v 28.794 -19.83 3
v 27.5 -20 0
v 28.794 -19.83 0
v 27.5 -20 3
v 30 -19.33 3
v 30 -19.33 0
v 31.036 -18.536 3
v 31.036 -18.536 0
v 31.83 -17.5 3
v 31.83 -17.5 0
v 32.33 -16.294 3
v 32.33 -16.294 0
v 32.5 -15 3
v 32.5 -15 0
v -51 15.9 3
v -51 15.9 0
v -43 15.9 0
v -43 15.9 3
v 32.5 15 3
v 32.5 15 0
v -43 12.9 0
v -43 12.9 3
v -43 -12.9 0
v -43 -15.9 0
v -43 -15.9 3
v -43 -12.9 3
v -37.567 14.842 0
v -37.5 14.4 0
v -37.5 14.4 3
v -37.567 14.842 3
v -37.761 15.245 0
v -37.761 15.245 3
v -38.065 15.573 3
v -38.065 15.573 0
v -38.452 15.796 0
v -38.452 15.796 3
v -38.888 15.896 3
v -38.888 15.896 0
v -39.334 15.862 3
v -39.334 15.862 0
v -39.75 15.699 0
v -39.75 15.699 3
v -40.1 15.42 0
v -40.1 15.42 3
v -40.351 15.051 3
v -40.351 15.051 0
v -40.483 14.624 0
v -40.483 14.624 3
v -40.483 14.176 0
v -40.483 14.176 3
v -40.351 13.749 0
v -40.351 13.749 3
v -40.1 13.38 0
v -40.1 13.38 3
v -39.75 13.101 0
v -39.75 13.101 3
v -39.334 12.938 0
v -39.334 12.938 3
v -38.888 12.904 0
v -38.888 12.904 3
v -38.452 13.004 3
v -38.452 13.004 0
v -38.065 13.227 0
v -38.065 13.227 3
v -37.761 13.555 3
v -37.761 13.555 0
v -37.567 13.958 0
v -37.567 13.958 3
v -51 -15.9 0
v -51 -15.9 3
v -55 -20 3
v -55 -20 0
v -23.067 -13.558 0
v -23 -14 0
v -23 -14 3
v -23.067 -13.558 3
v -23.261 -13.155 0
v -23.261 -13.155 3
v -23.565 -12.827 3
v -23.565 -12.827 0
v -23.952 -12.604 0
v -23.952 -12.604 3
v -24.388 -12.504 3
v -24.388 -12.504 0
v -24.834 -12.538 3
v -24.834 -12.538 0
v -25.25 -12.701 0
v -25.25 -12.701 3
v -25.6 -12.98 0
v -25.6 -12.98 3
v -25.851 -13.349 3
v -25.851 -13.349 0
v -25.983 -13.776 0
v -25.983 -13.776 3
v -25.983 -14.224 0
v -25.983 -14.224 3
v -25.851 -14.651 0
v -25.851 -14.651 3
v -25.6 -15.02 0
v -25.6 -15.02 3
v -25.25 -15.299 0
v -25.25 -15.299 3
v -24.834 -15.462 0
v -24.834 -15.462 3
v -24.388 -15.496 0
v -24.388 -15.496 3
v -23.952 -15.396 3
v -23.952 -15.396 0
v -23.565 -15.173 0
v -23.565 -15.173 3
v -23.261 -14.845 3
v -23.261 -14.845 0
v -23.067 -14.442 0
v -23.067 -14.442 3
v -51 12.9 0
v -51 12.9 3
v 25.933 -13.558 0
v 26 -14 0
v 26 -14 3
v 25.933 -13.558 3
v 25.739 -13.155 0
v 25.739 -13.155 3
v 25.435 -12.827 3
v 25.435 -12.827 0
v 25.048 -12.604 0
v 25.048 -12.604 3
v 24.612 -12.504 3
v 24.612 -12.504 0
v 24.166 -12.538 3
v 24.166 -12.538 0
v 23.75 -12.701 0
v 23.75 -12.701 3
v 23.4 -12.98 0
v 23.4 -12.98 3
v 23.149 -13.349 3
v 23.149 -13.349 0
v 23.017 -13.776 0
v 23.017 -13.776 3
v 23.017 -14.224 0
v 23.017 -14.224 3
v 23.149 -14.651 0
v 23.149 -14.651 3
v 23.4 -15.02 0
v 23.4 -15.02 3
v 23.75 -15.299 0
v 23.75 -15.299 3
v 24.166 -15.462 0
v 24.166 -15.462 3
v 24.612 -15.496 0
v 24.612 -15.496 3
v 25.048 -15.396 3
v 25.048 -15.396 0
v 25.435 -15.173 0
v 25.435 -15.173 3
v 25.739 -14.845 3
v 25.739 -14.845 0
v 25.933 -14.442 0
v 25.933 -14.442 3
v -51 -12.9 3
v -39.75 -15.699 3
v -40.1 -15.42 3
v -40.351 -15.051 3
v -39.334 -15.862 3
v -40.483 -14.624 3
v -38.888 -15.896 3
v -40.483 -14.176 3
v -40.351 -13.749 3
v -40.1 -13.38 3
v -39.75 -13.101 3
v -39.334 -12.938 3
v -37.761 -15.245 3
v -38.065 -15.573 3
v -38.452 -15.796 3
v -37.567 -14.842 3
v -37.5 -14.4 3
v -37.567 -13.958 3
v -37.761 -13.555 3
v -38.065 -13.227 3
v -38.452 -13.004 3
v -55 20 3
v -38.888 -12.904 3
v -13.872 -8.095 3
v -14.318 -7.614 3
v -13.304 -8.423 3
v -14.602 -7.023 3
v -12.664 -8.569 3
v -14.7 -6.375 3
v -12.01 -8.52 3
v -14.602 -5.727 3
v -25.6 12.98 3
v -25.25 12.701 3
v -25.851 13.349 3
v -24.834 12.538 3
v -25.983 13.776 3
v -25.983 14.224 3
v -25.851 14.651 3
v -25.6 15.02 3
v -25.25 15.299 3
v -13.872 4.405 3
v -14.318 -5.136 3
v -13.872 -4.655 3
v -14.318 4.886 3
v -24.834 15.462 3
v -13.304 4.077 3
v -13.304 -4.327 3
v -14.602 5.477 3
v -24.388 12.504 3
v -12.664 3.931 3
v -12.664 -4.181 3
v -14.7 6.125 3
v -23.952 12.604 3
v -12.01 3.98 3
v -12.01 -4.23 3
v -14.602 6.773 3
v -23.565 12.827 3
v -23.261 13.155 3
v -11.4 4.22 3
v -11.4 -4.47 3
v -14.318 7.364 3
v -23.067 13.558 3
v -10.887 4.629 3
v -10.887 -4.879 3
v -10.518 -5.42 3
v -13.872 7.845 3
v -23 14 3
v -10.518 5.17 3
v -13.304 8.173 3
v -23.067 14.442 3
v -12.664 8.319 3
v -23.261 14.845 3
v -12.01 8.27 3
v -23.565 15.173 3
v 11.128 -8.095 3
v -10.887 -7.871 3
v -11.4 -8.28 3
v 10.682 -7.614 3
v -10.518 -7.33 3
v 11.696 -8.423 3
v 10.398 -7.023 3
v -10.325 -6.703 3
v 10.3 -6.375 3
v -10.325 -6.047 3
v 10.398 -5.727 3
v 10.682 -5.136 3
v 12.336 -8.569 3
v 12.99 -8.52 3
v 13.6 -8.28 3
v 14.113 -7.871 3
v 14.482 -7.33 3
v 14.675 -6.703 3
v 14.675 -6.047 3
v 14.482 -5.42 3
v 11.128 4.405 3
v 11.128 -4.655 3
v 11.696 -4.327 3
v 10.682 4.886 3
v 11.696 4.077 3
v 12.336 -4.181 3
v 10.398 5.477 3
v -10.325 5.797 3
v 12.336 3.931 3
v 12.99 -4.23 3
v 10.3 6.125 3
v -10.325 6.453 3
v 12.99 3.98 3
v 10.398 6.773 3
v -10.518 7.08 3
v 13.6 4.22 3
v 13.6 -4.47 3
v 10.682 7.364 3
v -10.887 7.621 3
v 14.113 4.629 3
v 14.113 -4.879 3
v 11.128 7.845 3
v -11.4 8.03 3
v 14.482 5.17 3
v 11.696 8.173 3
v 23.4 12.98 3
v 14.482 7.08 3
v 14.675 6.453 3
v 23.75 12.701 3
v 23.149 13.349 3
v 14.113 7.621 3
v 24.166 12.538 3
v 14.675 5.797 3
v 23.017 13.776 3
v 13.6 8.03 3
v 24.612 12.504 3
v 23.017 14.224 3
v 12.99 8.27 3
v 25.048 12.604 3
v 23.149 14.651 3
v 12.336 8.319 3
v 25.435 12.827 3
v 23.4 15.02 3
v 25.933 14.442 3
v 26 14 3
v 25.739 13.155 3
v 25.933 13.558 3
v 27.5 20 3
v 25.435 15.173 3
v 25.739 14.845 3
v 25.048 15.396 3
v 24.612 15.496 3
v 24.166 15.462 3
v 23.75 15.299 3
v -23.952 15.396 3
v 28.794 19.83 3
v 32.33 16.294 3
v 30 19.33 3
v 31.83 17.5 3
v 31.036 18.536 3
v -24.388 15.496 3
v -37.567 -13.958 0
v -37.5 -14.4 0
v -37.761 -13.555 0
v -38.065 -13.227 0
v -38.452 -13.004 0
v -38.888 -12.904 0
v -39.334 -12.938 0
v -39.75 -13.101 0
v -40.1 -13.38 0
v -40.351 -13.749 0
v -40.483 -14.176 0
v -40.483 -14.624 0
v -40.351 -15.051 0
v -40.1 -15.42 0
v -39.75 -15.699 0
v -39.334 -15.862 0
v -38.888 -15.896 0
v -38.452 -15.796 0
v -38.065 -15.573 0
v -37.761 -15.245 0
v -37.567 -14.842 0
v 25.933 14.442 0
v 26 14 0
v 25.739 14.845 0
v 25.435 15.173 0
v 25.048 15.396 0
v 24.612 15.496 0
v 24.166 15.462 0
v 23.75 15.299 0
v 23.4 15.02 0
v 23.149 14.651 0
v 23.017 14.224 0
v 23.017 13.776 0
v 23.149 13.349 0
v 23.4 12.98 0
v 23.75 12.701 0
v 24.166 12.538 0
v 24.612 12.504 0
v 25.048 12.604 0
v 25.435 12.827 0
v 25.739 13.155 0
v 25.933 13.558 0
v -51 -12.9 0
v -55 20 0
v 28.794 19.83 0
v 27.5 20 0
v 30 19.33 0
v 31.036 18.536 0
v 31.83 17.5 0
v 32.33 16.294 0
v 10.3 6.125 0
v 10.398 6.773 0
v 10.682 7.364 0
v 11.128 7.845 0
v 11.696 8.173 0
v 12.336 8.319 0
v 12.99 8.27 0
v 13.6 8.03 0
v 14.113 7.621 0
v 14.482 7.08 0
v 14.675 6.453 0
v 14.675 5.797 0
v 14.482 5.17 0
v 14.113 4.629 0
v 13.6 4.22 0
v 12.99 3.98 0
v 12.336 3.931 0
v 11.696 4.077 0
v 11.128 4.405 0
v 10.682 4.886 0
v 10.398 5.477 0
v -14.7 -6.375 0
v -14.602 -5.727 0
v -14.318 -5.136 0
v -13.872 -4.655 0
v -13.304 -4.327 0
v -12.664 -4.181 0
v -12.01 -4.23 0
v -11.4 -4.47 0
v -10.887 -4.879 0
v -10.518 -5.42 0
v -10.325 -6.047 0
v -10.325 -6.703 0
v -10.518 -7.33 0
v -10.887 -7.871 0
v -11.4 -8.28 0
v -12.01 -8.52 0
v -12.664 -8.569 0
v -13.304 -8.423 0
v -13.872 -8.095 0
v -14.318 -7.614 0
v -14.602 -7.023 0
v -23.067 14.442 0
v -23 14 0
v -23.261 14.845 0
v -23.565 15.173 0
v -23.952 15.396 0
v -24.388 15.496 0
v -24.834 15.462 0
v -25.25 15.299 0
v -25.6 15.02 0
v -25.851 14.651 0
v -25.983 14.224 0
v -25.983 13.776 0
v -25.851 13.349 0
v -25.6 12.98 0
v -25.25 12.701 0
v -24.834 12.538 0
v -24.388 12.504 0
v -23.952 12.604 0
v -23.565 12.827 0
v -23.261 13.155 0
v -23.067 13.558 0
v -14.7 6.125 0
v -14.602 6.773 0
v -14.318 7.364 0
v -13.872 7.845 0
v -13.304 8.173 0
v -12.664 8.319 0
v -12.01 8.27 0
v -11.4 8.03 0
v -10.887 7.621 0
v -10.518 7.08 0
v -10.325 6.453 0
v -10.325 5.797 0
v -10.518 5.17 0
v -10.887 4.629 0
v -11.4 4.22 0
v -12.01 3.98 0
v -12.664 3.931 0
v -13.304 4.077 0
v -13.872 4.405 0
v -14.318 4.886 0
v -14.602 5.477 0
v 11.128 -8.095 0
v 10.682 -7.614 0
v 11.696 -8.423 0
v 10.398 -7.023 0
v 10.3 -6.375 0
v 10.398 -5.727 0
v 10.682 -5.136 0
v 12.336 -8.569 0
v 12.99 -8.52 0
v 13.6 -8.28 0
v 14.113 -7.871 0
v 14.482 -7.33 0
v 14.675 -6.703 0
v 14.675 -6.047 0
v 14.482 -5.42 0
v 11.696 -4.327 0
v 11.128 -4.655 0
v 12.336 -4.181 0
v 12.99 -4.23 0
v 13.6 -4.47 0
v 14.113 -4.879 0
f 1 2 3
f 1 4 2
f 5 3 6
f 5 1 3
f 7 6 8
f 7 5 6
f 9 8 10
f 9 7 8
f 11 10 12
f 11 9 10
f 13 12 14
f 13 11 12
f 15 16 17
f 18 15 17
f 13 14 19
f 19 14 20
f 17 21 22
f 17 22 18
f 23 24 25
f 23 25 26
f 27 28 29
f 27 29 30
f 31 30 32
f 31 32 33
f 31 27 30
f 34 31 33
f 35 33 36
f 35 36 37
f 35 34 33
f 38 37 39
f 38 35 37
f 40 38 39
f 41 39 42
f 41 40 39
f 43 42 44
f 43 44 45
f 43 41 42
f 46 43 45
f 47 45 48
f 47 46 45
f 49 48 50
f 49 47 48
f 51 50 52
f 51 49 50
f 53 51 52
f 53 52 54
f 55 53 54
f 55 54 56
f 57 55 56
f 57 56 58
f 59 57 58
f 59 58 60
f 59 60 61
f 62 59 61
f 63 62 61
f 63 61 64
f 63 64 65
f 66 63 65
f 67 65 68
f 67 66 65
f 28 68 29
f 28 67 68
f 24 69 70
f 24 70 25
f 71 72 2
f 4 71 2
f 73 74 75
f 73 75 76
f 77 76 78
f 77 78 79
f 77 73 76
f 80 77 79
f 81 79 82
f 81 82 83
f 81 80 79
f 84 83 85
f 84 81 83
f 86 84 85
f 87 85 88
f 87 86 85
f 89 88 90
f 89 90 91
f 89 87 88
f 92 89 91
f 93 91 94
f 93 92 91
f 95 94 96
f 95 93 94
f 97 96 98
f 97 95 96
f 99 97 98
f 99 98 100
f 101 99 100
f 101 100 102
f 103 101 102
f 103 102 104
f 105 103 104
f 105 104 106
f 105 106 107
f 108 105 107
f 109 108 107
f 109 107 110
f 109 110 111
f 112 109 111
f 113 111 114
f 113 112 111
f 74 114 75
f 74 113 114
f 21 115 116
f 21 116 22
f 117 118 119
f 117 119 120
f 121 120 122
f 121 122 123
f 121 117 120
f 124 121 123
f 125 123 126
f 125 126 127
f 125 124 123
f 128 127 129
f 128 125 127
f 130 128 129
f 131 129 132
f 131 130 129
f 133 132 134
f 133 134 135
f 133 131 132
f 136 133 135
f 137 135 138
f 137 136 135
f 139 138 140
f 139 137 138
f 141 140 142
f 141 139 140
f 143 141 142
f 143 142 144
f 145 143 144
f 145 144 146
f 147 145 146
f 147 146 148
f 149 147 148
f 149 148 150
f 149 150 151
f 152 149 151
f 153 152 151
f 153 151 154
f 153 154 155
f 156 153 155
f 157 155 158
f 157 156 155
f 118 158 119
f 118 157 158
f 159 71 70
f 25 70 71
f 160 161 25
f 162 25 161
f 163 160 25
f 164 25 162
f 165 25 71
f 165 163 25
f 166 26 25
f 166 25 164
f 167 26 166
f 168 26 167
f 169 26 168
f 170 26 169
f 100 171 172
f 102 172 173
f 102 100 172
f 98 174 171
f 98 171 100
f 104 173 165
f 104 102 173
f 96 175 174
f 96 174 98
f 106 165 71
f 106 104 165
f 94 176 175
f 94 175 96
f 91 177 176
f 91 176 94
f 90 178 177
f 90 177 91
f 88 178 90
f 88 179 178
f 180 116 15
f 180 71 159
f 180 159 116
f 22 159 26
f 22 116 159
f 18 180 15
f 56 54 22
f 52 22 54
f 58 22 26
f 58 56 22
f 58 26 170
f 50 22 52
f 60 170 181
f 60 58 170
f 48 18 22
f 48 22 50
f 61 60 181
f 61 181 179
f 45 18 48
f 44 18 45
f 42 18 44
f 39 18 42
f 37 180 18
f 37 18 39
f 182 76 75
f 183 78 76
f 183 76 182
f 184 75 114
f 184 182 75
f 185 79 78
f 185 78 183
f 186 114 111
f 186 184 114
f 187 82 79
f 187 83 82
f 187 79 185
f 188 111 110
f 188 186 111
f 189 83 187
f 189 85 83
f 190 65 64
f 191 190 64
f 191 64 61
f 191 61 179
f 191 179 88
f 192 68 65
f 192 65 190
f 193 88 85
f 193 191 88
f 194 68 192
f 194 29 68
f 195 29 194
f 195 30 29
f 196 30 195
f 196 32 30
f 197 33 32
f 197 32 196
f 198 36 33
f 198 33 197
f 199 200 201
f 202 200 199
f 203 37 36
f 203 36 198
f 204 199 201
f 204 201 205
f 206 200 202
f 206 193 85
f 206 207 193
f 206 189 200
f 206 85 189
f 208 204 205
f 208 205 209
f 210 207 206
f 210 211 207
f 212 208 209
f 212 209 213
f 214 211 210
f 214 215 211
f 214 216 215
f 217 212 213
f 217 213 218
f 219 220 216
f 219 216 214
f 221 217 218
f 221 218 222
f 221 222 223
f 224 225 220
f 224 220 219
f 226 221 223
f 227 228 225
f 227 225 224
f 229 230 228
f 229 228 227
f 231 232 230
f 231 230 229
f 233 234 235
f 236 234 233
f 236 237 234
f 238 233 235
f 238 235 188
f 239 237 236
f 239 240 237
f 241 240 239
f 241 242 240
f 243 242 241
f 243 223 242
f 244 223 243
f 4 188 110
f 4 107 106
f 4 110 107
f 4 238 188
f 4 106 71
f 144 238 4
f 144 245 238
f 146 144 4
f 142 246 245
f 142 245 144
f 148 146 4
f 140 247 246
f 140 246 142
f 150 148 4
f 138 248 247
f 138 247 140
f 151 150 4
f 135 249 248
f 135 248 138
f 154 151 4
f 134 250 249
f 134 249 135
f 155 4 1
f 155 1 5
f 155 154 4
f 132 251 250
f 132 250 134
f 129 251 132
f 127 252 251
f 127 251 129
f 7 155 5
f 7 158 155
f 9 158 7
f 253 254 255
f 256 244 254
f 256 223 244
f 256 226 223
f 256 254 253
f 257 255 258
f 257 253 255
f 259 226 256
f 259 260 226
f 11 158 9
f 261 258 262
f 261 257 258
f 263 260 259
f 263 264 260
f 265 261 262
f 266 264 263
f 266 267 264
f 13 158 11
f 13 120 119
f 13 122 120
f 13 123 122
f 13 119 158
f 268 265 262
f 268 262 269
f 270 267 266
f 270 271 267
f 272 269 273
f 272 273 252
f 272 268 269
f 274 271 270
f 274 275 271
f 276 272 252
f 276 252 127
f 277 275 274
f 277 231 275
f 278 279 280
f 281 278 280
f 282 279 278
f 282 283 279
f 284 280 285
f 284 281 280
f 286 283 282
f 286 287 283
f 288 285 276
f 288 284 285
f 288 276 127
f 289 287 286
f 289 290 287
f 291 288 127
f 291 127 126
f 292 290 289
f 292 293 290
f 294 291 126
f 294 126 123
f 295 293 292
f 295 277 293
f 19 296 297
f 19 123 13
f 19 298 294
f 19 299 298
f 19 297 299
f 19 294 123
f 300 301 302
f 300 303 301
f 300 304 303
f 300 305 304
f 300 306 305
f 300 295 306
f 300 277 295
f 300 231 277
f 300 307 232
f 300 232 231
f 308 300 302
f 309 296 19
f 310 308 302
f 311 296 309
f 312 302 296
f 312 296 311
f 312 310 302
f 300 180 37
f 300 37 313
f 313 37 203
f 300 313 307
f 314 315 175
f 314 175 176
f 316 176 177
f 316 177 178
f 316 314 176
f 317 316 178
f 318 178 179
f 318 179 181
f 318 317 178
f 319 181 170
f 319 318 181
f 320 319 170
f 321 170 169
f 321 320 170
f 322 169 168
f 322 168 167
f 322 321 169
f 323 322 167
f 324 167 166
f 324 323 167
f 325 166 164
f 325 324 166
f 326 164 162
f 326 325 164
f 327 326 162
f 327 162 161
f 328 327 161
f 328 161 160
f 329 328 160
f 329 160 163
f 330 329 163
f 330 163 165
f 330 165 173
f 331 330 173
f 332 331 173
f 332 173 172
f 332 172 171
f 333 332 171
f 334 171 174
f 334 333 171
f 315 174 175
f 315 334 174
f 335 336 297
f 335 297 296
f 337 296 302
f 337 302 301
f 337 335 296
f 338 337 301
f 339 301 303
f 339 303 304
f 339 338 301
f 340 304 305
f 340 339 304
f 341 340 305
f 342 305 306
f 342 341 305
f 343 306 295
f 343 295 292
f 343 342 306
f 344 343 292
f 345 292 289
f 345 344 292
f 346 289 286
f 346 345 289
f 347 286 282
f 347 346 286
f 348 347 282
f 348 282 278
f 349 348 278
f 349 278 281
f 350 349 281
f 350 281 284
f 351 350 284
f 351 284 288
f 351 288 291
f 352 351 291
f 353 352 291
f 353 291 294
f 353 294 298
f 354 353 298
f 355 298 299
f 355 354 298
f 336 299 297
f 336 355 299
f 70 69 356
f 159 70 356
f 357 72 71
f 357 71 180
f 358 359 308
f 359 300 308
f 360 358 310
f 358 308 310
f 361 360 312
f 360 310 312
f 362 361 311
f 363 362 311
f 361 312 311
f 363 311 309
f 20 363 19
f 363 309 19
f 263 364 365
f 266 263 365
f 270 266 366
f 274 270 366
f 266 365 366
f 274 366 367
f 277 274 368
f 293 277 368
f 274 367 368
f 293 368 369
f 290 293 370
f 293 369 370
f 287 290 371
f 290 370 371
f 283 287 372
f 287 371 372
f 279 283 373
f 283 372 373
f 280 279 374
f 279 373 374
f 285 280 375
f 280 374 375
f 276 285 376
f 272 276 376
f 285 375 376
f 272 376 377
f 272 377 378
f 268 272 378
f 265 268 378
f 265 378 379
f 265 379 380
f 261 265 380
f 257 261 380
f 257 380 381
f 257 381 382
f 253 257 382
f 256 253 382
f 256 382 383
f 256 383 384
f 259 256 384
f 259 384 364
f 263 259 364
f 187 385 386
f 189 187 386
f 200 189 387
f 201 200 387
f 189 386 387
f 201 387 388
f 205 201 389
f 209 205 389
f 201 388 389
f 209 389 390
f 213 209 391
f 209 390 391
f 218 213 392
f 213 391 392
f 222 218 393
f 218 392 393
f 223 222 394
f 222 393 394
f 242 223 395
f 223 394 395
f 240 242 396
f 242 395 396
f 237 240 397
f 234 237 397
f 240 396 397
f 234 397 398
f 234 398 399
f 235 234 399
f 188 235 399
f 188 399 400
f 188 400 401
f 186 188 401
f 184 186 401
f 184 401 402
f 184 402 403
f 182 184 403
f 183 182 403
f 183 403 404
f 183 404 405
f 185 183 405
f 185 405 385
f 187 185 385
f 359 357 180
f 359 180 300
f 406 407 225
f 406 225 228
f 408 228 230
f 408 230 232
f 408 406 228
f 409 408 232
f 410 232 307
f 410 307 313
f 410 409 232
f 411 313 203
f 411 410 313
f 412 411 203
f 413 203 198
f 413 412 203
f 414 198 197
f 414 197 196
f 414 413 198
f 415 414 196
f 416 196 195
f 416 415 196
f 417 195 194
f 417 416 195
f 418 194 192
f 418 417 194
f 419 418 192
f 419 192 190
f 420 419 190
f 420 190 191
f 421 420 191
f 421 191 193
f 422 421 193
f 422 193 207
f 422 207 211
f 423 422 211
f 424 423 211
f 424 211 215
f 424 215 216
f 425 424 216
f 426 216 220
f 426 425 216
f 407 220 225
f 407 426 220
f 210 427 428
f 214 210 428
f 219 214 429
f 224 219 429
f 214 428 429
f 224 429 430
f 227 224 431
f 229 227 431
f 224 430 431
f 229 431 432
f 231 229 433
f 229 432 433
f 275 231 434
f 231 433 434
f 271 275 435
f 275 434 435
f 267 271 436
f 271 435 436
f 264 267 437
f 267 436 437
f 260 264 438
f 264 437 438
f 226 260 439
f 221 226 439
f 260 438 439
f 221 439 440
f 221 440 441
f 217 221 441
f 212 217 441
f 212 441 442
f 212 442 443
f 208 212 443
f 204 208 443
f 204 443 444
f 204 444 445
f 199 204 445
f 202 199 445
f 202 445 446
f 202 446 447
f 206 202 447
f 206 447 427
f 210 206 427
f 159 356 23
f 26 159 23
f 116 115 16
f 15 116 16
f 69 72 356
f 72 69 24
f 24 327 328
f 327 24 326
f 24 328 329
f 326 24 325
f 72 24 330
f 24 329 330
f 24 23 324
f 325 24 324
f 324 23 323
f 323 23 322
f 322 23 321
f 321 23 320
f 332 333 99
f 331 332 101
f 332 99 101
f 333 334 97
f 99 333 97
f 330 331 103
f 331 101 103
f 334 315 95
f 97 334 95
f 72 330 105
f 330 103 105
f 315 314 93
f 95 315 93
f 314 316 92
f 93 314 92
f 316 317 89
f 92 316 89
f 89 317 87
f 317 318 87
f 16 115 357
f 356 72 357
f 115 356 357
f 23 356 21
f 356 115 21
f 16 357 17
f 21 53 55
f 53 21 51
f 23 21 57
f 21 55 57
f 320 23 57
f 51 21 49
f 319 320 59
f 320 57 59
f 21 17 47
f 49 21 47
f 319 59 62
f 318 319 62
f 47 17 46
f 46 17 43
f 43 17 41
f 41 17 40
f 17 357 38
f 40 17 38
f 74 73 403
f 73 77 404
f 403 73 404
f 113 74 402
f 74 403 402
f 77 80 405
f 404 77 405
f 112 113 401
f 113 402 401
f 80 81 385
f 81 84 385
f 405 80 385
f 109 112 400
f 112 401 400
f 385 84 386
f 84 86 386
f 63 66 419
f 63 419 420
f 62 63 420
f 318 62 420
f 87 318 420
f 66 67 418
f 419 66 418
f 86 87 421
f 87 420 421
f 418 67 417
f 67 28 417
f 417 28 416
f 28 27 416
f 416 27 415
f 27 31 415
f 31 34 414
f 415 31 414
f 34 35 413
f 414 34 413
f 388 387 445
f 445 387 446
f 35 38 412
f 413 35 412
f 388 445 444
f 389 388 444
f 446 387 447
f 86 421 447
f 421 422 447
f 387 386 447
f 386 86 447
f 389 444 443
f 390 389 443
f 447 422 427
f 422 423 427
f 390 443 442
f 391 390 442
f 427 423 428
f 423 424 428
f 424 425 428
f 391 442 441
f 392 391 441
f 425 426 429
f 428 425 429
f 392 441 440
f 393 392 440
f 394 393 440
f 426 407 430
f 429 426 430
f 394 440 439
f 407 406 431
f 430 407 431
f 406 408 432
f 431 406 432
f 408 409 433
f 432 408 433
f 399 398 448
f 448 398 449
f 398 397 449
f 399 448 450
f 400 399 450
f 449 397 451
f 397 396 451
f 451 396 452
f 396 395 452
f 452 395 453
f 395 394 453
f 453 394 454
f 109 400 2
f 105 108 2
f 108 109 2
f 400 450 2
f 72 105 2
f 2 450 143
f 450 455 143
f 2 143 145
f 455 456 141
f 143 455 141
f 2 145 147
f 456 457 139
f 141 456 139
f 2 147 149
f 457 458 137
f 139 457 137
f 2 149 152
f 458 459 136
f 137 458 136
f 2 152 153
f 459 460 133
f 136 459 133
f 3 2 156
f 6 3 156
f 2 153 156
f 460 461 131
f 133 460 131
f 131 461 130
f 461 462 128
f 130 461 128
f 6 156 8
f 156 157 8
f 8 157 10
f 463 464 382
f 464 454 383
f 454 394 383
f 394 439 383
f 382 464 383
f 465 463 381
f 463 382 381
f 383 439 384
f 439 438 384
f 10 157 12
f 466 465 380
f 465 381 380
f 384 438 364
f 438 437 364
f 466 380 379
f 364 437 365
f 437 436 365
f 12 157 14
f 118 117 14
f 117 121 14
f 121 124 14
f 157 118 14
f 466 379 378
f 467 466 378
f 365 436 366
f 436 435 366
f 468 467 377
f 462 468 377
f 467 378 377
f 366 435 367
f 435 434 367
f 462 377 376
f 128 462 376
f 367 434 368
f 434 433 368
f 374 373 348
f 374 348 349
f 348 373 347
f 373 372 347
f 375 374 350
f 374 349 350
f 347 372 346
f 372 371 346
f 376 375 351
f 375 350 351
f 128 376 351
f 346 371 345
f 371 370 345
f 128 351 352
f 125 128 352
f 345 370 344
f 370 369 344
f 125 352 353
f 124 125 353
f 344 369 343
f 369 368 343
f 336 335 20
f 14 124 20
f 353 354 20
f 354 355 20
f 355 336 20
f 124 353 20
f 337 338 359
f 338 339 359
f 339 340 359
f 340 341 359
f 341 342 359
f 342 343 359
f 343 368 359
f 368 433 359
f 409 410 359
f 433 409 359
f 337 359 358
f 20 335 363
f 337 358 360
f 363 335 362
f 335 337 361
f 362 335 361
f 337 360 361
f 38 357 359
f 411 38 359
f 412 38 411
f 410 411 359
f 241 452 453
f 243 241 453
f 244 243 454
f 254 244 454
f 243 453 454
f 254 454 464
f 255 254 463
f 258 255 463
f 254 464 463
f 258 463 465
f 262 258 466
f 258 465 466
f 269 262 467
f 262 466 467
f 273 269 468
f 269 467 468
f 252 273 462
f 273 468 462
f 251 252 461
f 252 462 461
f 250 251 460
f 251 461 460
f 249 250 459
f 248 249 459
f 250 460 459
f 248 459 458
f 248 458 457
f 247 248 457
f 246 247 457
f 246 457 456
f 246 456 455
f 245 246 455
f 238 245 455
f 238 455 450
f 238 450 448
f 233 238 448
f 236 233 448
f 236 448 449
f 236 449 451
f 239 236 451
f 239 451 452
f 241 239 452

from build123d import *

# Parameters (mm, degrees)
F1_W     = 87.5
F1_H     = 40
F1_W_2   = 8
F1_H_2   = 3
F1_R     = 1.5
F2_DEPTH = 3
F4_D     = 4.4
F5_R     = 5


with BuildPart() as f2:
    # F1 (on Top) → F2 (new body)
    with BuildSketch(Plane.XY):
        with Locations((-11.25, 0)):
            Rectangle(F1_W, F1_H)
        with Locations((-47, -14.4)):
            Rectangle(F1_W_2, F1_H_2, mode=Mode.SUBTRACT)
        with Locations((-39, -14.4)):
            Circle(F1_R, mode=Mode.SUBTRACT)
        with Locations((-24.5, -14)):
            Circle(F1_R, mode=Mode.SUBTRACT)
        with Locations((24.5, -14)):
            Circle(F1_R, mode=Mode.SUBTRACT)
        with Locations((-47, 14.4)):
            Rectangle(F1_W_2, F1_H_2, mode=Mode.SUBTRACT)
        with Locations((-39, 14.4)):
            Circle(F1_R, mode=Mode.SUBTRACT)
        with Locations((-24.5, 14)):
            Circle(F1_R, mode=Mode.SUBTRACT)
        with Locations((24.5, 14)):
            Circle(F1_R, mode=Mode.SUBTRACT)
    extrude(amount=F2_DEPTH)

    # F4 (through all)
    with Locations(Plane.XY.offset(3)):
        with Locations((-12.5, 6.125), (-12.5, -6.375), (12.5, 6.125), (12.5, -6.375)):
            Hole(F4_D / 2)

    # F5
    f5_edges = [f2.edges().sort_by_distance(p)[0] for p in [
        (32.5, 20, 1.5),
        (32.5, -20, 1.5),
    ]]
    fillet(f5_edges, radius=F5_R)


solid = f2.part
